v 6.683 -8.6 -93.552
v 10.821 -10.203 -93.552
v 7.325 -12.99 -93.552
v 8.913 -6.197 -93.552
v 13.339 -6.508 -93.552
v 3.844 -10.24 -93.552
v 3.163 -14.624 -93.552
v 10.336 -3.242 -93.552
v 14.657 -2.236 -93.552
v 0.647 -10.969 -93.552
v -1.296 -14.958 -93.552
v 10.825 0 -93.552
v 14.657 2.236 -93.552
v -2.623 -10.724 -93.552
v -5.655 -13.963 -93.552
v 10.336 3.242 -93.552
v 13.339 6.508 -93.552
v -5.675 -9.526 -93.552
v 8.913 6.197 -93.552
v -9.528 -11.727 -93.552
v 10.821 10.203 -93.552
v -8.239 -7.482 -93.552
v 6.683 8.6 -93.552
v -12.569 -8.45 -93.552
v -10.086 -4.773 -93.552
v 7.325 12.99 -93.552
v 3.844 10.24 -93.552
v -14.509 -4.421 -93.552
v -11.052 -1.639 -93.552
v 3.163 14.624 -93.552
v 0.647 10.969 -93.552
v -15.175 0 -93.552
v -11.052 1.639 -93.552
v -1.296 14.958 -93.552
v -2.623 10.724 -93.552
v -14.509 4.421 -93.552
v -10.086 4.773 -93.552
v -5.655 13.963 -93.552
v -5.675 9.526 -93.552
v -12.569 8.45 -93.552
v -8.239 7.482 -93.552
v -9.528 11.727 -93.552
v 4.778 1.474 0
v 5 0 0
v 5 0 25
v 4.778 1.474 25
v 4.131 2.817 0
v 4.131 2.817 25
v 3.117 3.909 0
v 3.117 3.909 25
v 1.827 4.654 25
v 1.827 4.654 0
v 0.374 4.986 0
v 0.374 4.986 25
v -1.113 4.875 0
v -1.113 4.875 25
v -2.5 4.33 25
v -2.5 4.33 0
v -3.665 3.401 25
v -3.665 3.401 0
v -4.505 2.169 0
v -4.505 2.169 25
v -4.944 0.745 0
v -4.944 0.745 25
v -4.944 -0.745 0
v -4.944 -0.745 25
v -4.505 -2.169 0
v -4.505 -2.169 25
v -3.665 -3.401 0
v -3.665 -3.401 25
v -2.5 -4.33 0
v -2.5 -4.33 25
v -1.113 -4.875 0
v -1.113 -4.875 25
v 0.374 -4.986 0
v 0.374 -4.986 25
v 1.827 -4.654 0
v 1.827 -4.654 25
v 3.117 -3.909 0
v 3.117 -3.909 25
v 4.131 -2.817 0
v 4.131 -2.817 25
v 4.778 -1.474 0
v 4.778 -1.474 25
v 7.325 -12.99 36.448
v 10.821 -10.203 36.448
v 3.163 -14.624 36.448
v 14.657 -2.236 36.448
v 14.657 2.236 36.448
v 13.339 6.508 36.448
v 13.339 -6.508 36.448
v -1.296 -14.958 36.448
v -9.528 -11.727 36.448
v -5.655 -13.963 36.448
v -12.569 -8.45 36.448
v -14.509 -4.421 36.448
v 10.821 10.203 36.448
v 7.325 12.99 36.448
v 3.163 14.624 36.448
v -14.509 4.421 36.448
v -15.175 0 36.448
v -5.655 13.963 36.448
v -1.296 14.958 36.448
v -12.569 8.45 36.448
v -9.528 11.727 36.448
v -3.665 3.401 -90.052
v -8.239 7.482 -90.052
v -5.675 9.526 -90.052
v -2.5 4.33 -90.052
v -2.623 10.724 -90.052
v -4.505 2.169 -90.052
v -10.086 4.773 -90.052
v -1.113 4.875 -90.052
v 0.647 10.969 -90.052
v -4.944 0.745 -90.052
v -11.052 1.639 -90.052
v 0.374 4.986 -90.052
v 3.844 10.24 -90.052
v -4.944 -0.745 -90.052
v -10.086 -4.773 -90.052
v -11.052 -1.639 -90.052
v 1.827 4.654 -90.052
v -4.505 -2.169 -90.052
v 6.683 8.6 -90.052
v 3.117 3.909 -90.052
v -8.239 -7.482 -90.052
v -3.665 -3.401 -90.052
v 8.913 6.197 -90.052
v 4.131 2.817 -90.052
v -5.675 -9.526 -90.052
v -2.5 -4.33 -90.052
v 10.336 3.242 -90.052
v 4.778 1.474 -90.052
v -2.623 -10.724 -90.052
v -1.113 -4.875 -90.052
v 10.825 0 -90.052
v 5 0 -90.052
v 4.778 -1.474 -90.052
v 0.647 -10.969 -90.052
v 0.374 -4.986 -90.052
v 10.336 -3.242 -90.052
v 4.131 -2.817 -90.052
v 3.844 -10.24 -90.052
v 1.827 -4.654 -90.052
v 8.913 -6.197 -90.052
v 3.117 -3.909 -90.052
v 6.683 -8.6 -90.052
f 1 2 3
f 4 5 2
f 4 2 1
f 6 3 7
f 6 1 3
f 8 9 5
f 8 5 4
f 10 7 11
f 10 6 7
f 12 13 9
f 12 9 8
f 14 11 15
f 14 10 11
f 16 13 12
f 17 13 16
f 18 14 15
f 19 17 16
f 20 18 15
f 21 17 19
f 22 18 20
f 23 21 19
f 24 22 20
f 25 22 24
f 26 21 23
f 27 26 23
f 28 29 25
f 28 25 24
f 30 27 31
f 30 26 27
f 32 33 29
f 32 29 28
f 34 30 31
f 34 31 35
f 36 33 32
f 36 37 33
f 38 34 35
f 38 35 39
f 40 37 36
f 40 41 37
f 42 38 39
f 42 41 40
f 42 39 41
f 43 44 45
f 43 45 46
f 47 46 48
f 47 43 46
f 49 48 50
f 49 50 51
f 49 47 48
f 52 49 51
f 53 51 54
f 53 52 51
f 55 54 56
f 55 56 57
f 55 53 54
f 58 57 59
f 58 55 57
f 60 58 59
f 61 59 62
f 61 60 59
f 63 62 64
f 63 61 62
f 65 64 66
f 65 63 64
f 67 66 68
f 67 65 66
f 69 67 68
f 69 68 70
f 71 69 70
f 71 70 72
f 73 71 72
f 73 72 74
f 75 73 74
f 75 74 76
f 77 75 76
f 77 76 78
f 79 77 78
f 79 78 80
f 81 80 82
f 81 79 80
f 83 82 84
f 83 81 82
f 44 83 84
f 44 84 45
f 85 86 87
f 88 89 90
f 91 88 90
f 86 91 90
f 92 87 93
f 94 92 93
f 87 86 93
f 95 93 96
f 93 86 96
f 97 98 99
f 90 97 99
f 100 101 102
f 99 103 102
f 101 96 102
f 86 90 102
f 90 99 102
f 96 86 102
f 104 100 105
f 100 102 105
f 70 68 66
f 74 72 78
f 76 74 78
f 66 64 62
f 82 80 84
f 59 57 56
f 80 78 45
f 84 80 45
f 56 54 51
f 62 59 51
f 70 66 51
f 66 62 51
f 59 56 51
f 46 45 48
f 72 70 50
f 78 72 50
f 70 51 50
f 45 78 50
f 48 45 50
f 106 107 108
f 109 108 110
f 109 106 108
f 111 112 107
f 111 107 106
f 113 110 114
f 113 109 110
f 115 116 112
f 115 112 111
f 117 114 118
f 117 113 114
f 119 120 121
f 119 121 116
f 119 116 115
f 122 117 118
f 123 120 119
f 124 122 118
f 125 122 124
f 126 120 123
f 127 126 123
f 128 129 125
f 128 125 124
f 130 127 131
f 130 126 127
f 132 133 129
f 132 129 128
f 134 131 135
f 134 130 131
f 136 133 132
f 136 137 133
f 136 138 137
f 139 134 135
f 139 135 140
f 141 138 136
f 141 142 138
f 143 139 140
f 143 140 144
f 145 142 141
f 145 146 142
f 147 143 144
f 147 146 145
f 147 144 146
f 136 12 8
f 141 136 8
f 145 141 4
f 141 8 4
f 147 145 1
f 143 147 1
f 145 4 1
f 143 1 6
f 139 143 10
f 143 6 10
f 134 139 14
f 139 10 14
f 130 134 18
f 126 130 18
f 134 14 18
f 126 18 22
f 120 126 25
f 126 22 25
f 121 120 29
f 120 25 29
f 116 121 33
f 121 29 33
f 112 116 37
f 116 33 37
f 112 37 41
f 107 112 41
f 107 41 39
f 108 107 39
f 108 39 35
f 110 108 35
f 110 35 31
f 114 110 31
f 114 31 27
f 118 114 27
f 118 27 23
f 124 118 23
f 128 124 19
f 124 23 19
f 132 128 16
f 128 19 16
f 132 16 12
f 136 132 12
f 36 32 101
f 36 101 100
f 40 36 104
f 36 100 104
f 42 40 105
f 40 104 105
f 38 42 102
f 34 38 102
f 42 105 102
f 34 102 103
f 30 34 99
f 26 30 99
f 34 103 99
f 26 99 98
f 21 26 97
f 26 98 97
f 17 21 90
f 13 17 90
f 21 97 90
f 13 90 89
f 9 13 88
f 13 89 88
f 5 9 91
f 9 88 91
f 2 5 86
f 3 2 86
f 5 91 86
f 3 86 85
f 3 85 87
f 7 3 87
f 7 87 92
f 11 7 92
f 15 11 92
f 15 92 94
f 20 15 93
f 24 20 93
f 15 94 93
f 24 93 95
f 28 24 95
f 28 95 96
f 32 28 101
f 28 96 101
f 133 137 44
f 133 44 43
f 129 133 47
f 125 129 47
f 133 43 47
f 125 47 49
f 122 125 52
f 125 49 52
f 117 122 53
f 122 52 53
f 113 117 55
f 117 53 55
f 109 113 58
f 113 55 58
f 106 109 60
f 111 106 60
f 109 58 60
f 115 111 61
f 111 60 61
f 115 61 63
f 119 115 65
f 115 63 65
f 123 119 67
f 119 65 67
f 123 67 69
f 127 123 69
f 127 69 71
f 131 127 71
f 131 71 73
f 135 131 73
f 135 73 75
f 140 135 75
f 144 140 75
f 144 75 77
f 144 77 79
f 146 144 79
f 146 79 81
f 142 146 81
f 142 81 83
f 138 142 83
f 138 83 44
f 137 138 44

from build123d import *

# Parameters (mm, degrees)
F0_W          = 15
F0_H          = 130
F2_R          = 5
F3_DEPTH      = 93.5532969241
F3_DEPTH_BACK = 25
F4_R          = 11
F5_DEPTH      = 3.5


with BuildPart() as f1:
    # F0 (on Front) → F1 (revolve)
    with BuildSketch(Plane.XZ):
        with Locations((-7.6752220338, -28.5522969241)):
            Rectangle(F0_W, F0_H)
    revolve(axis=Axis((-0.1752220338, 0, -28.5522969241), (0, 0, -1)))

    # F2 (on Top) → F3 (cut, two sides)
    with BuildSketch(Plane.XY) as f3_sk:
        Circle(F2_R)
    extrude(amount=-F3_DEPTH, mode=Mode.SUBTRACT)
    extrude(f3_sk.sketch, amount=F3_DEPTH_BACK, mode=Mode.SUBTRACT)

    # F4 (on face) → F5 (cut)
    with BuildSketch(Plane(origin=(0, 0, -93.5522969241), x_dir=(1, 0, 0), z_dir=(0, 0, -1))):
        with Locations((-0.1752220338, 0)):
            Circle(F4_R)
    extrude(amount=-F5_DEPTH, mode=Mode.SUBTRACT)


solid = f1.part
